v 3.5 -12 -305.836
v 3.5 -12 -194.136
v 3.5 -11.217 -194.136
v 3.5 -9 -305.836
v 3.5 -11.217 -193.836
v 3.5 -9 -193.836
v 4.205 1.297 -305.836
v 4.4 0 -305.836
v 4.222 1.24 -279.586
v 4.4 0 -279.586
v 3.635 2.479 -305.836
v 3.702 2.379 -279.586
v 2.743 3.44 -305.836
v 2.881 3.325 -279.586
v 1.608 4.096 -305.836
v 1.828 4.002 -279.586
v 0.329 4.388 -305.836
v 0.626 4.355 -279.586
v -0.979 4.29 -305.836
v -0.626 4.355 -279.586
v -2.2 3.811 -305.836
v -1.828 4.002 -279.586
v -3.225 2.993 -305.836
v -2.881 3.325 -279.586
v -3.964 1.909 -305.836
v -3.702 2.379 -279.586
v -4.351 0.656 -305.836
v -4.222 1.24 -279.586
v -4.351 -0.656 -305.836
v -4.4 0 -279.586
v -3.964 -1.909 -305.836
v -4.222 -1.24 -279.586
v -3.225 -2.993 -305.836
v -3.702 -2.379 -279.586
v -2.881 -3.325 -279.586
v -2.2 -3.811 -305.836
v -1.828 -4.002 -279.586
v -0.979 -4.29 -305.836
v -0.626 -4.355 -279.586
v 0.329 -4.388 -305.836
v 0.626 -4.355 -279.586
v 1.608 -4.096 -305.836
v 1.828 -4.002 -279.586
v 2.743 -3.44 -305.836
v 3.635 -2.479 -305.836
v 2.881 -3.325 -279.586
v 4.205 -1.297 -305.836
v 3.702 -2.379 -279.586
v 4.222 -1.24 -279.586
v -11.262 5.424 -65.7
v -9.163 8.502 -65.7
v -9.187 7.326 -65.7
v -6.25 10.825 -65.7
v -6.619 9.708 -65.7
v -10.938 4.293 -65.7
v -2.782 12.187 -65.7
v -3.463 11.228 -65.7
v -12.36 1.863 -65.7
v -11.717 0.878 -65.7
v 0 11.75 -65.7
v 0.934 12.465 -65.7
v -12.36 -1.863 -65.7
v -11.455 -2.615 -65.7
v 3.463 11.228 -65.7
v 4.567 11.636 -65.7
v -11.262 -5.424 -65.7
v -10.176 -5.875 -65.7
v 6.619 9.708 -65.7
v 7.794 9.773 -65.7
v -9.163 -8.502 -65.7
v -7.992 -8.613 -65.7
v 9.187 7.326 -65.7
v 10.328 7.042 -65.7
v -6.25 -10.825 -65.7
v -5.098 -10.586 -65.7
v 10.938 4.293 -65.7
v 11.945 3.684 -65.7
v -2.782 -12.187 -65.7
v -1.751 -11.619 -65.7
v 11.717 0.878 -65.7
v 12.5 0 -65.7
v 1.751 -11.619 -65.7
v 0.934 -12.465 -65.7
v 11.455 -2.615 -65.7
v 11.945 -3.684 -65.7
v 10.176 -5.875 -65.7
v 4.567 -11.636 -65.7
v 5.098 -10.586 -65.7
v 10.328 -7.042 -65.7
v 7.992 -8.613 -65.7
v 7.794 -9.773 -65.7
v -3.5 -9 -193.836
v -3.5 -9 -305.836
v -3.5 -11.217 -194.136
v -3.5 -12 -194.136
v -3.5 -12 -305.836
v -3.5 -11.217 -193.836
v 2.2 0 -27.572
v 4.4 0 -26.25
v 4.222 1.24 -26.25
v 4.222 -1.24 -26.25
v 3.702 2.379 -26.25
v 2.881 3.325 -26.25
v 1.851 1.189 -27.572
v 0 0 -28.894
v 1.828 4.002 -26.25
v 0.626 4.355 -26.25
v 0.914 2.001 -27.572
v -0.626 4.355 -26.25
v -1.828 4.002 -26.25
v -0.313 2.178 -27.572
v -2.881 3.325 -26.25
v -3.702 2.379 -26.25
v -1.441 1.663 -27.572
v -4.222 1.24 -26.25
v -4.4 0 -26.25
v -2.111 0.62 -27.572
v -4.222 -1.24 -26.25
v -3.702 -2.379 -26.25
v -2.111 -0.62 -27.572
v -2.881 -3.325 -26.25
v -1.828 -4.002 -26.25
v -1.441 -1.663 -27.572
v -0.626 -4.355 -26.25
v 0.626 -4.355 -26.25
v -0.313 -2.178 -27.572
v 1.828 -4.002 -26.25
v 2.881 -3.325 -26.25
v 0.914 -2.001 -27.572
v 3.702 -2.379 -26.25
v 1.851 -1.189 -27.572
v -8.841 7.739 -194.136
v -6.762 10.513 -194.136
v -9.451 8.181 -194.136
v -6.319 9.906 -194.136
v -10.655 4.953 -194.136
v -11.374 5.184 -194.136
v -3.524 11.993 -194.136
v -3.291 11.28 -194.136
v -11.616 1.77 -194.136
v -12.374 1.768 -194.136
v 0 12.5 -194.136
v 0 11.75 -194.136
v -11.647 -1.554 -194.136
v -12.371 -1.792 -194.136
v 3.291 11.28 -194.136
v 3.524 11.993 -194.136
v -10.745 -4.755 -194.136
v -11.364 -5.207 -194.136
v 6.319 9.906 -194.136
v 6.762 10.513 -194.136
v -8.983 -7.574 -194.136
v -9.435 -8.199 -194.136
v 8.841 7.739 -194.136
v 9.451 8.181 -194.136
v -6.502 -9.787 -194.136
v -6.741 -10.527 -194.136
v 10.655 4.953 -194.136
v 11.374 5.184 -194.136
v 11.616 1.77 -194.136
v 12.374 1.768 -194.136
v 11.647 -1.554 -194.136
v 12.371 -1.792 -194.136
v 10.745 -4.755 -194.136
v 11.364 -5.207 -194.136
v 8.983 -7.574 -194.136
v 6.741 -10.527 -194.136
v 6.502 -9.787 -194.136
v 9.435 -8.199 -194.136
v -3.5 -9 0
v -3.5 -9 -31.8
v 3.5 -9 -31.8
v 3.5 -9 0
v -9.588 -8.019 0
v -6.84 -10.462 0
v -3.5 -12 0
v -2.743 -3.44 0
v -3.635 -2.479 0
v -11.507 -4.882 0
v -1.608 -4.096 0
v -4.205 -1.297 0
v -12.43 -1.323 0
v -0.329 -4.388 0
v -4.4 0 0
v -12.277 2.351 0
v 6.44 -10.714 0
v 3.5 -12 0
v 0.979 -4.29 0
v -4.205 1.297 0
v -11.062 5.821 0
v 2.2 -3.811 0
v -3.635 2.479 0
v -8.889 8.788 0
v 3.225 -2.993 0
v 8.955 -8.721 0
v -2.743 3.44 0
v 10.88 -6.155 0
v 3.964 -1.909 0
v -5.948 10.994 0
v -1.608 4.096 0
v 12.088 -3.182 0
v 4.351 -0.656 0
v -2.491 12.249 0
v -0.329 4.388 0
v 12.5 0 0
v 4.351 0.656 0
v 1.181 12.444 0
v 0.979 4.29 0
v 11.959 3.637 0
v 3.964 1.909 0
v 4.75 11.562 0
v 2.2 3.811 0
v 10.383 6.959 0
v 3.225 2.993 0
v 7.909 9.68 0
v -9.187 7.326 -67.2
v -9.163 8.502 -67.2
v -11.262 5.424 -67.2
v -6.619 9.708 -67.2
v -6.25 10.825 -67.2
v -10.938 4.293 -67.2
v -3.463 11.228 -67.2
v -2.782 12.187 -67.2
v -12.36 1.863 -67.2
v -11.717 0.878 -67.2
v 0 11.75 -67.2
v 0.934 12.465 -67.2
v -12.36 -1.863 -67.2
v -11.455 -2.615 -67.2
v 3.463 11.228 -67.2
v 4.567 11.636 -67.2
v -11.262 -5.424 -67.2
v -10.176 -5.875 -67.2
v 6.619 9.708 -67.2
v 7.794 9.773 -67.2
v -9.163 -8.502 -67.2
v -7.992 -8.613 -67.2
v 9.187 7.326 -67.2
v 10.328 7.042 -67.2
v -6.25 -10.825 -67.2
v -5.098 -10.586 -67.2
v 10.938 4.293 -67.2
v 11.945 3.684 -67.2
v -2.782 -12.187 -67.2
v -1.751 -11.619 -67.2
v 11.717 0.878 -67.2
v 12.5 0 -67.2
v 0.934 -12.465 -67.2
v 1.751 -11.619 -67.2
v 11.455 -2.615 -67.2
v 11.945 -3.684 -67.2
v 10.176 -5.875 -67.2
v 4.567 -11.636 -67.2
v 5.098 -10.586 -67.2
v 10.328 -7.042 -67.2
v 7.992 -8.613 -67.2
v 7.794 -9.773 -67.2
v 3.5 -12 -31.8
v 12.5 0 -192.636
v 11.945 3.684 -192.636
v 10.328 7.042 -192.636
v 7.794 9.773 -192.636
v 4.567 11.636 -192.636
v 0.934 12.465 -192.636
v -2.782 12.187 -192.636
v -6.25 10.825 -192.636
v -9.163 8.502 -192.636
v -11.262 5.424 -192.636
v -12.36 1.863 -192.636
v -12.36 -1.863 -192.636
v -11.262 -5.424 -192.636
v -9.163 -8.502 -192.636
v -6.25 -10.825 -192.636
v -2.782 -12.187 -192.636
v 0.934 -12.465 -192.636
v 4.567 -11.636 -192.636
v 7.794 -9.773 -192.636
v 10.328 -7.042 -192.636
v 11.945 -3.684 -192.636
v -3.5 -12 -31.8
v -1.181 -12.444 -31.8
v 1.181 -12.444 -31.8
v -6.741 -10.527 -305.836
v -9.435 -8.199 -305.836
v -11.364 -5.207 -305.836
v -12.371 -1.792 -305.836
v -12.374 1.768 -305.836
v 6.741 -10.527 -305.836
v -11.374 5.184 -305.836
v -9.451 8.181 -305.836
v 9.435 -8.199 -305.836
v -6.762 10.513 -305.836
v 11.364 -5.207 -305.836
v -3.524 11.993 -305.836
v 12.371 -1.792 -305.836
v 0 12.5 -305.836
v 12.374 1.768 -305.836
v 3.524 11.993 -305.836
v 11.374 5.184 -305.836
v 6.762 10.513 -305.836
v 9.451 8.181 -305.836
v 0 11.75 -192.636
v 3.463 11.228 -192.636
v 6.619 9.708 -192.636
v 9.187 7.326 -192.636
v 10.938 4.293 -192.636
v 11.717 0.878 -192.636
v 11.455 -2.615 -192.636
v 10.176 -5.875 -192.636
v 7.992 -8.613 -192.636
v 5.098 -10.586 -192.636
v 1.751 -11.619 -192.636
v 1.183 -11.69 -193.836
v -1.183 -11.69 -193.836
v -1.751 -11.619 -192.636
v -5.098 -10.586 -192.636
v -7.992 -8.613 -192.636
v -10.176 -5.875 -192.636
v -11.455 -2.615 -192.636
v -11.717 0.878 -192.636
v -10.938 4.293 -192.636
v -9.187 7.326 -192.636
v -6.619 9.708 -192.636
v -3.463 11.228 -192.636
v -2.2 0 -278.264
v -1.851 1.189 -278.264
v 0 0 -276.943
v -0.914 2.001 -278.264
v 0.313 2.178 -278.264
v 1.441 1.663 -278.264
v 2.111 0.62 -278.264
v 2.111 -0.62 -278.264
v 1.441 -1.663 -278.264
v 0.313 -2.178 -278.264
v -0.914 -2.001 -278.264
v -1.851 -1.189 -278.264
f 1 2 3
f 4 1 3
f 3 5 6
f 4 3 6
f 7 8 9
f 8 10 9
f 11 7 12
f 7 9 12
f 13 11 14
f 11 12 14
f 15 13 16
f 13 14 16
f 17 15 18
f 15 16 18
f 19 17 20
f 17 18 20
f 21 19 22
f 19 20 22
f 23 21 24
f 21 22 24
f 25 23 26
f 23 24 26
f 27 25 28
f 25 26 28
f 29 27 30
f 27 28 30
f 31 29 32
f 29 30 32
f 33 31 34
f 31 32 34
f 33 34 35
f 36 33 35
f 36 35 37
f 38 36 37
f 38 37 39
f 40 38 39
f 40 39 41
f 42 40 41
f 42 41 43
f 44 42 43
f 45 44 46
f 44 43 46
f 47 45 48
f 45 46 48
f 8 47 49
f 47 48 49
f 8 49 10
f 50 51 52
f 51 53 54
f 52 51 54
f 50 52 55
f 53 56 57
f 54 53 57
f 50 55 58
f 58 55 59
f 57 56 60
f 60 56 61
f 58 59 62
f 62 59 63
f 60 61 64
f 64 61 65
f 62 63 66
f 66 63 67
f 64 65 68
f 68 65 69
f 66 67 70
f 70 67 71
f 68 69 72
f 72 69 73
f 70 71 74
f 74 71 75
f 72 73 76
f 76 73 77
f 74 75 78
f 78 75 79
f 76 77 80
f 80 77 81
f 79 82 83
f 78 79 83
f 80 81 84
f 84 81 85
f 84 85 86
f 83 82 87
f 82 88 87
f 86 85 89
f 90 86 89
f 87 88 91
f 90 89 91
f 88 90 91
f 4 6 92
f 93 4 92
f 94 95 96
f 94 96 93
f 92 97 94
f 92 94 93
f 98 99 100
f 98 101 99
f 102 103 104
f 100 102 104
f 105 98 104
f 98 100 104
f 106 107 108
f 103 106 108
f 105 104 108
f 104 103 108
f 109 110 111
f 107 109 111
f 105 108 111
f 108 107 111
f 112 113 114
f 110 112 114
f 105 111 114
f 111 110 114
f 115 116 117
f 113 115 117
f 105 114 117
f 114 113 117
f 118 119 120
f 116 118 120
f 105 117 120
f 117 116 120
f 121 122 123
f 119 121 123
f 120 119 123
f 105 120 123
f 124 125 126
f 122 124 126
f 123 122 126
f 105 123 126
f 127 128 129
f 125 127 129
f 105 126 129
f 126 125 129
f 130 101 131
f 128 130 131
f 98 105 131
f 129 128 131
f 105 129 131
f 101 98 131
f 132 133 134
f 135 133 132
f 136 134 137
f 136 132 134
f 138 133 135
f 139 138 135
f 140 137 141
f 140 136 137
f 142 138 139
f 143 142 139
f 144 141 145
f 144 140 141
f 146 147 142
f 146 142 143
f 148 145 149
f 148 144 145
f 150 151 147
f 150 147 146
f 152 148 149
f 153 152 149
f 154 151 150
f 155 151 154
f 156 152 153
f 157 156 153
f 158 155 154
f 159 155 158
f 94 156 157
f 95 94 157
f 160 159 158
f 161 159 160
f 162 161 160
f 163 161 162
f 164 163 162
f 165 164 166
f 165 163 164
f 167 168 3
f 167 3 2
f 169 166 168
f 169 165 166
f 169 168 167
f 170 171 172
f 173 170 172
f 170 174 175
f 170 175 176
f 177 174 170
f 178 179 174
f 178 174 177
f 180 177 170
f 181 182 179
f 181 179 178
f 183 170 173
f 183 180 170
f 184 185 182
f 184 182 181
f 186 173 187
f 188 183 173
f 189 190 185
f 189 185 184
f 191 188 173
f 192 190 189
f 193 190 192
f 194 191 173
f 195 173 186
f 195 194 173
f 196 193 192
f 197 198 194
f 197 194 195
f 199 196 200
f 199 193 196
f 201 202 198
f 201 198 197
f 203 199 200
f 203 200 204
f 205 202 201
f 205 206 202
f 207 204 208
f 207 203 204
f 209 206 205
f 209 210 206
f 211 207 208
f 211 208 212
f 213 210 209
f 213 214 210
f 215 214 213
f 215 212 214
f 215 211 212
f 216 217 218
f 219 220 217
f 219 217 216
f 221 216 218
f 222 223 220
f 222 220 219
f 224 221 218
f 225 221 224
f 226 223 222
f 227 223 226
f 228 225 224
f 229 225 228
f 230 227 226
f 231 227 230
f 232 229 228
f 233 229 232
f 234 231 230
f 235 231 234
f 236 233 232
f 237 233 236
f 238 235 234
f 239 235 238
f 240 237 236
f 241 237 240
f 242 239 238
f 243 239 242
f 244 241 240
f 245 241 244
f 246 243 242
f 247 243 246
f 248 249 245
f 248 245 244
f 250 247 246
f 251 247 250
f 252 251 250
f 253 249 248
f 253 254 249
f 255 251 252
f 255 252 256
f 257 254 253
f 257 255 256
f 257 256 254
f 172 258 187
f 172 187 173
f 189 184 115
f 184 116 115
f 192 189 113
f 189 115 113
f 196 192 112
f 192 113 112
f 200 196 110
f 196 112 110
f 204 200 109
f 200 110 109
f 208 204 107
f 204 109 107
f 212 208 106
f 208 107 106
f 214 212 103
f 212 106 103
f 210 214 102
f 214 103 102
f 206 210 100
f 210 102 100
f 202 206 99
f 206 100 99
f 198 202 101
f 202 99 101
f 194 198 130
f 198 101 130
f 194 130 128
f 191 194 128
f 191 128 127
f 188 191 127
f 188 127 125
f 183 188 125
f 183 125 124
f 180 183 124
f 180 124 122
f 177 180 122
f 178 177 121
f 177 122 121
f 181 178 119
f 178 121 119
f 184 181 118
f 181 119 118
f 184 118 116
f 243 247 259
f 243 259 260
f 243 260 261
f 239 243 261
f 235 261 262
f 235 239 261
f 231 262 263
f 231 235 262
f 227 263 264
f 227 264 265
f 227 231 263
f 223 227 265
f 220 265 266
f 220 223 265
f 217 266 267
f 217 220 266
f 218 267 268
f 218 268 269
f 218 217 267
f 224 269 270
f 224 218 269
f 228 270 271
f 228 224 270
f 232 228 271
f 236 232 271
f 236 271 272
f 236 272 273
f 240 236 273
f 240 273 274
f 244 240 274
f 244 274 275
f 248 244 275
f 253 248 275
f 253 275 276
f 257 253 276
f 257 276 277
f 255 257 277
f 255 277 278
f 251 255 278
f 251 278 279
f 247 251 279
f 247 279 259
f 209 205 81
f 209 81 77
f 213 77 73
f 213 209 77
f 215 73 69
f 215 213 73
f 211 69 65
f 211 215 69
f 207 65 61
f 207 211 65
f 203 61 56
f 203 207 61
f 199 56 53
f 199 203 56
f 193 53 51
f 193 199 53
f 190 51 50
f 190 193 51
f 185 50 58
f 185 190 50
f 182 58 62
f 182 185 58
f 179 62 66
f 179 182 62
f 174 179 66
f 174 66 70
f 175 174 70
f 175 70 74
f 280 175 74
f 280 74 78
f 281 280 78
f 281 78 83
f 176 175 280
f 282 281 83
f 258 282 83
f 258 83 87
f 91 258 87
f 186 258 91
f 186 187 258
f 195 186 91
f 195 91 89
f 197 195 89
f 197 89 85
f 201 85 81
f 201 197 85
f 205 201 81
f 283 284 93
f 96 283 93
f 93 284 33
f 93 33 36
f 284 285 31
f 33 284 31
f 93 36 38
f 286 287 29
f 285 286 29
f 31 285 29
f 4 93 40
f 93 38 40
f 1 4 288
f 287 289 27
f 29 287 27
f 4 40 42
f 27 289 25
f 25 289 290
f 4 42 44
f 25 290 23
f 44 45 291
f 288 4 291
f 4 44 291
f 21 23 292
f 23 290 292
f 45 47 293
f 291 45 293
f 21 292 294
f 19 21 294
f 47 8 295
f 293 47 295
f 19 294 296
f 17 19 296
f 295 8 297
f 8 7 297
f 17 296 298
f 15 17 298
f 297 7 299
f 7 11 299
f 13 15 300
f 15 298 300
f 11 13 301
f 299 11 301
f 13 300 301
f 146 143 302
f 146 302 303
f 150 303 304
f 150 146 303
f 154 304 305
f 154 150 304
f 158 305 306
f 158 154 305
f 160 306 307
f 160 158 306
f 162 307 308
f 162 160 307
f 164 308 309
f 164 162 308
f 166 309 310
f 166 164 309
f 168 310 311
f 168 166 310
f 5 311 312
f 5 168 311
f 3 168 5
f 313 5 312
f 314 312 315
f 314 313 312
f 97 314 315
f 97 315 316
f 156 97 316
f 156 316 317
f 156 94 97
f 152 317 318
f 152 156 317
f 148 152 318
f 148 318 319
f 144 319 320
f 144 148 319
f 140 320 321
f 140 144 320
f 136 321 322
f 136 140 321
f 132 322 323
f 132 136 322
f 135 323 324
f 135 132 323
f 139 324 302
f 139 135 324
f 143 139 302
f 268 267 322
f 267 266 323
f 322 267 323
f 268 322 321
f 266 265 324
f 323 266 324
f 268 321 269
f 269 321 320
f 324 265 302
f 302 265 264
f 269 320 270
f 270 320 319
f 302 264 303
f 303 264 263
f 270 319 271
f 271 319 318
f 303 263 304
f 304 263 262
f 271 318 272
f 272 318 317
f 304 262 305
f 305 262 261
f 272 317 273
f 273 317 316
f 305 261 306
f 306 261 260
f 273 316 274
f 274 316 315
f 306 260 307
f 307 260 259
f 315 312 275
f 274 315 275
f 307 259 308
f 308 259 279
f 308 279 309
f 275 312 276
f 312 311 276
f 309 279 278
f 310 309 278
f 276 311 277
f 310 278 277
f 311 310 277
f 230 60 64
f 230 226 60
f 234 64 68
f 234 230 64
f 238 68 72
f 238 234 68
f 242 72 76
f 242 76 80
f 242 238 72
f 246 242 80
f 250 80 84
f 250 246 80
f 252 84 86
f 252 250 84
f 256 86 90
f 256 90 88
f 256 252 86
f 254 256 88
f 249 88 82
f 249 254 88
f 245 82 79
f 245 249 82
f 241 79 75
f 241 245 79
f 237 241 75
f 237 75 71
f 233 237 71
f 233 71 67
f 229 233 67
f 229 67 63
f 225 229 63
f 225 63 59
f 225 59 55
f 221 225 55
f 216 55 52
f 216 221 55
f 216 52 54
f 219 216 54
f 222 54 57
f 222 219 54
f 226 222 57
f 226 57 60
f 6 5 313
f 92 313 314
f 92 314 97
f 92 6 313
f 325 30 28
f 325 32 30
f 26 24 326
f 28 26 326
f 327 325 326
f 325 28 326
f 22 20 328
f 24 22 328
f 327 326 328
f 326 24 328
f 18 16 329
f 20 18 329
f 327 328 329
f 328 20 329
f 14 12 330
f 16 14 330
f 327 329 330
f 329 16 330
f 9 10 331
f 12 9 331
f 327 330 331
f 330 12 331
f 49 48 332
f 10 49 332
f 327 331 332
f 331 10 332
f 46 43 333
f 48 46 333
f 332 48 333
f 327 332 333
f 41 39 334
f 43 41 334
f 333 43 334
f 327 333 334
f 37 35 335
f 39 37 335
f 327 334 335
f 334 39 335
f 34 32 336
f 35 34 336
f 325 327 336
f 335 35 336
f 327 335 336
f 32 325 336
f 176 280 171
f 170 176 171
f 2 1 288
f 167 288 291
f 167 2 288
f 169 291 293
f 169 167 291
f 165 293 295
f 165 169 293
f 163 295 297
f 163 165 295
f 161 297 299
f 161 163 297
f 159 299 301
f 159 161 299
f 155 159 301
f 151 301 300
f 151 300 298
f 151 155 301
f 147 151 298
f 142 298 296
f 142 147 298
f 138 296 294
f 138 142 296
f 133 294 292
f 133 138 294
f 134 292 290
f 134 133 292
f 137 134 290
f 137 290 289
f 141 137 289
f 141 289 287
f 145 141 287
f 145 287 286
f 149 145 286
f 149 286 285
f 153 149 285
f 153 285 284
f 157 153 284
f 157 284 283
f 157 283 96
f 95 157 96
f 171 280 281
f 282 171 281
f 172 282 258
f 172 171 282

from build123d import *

# Parameters (mm, degrees)
SKETCH_1_R          = 12.5
EXTRUDE_1_DEPTH     = 305.836309
CUT_EXTRUDE_START   = -31.8
SKETCH_2_W          = 7
SKETCH_2_H          = 7
CUT_EXTRUDE_1_DEPTH = 31.8
CUT_EXTRUDE_START_2 = -112
SKETCH_3_W          = 7
SKETCH_3_H          = 7
CUT_EXTRUDE_2_DEPTH = 112
M10X1_251_D         = 8.8
M10X1_251_DEPTH     = 26.25
M10X1_251_TIP       = 2.643786724
M10X1_252_D         = 8.8
M10X1_252_DEPTH     = 26.25
M10X1_252_TIP       = 2.643786724
SKETCH_8_W          = 1.5
SKETCH_8_H          = 0.75


with BuildPart() as part:
    # Эскиз1 → Бобышка-Вытянуть1 (new body)
    with BuildSketch(Plane.XY):
        Circle(SKETCH_1_R)
    extrude(amount=-EXTRUDE_1_DEPTH)

    # Эскиз2 → Вырез-Вытянуть1 (cut)
    with BuildSketch(Plane.XY.offset(CUT_EXTRUDE_START)):
        with Locations((0, -12.5)):
            Rectangle(SKETCH_2_W, SKETCH_2_H)
    extrude(amount=CUT_EXTRUDE_1_DEPTH, mode=Mode.SUBTRACT)

    # Эскиз3 → Вырез-Вытянуть2 (cut)
    with BuildSketch(Plane(origin=(0, 0, -305.836309448), x_dir=(-1, 0, 0), z_dir=(0, 0, -1)).offset(CUT_EXTRUDE_START_2)):
        with Locations((0, -12.5)):
            Rectangle(SKETCH_3_W, SKETCH_3_H)
    extrude(amount=CUT_EXTRUDE_2_DEPTH, mode=Mode.SUBTRACT)

    # Отверстие обработанное метчиком M10x1.251
    with Locations(Plane.XY):
        with Locations((0, 0)):
            Hole(M10X1_251_D / 2, depth=M10X1_251_DEPTH)
            with Locations((0, 0, -(M10X1_251_DEPTH + M10X1_251_TIP / 2))):  # 118° drill point
                Cone(0, M10X1_251_D / 2, M10X1_251_TIP, mode=Mode.SUBTRACT)

    # Отверстие обработанное метчиком M10x1.252
    with Locations(Plane(origin=(0, 0, -305.836309448), x_dir=(-1, 0, 0), z_dir=(0, 0, -1))):
        with Locations((0, 0)):
            Hole(M10X1_252_D / 2, depth=M10X1_252_DEPTH)
            with Locations((0, 0, -(M10X1_252_DEPTH + M10X1_252_TIP / 2))):  # 118° drill point
                Cone(0, M10X1_252_D / 2, M10X1_252_TIP, mode=Mode.SUBTRACT)

    # Эскиз8 → Вырез-Повернуть1 (revolve, cut)
    with BuildSketch(Plane(origin=(0, 0, 0), x_dir=(0, 0, -1), z_dir=(1, 0, 0))):
        with Locations((66.45, 12.125)):
            Rectangle(SKETCH_8_W, SKETCH_8_H)
        with Locations((193.386309448, 12.125)):
            Rectangle(SKETCH_8_W, SKETCH_8_H)
    revolve(axis=Axis((0, 0, 1000), (0, 0, -1)), mode=Mode.SUBTRACT)


solid = part.part
